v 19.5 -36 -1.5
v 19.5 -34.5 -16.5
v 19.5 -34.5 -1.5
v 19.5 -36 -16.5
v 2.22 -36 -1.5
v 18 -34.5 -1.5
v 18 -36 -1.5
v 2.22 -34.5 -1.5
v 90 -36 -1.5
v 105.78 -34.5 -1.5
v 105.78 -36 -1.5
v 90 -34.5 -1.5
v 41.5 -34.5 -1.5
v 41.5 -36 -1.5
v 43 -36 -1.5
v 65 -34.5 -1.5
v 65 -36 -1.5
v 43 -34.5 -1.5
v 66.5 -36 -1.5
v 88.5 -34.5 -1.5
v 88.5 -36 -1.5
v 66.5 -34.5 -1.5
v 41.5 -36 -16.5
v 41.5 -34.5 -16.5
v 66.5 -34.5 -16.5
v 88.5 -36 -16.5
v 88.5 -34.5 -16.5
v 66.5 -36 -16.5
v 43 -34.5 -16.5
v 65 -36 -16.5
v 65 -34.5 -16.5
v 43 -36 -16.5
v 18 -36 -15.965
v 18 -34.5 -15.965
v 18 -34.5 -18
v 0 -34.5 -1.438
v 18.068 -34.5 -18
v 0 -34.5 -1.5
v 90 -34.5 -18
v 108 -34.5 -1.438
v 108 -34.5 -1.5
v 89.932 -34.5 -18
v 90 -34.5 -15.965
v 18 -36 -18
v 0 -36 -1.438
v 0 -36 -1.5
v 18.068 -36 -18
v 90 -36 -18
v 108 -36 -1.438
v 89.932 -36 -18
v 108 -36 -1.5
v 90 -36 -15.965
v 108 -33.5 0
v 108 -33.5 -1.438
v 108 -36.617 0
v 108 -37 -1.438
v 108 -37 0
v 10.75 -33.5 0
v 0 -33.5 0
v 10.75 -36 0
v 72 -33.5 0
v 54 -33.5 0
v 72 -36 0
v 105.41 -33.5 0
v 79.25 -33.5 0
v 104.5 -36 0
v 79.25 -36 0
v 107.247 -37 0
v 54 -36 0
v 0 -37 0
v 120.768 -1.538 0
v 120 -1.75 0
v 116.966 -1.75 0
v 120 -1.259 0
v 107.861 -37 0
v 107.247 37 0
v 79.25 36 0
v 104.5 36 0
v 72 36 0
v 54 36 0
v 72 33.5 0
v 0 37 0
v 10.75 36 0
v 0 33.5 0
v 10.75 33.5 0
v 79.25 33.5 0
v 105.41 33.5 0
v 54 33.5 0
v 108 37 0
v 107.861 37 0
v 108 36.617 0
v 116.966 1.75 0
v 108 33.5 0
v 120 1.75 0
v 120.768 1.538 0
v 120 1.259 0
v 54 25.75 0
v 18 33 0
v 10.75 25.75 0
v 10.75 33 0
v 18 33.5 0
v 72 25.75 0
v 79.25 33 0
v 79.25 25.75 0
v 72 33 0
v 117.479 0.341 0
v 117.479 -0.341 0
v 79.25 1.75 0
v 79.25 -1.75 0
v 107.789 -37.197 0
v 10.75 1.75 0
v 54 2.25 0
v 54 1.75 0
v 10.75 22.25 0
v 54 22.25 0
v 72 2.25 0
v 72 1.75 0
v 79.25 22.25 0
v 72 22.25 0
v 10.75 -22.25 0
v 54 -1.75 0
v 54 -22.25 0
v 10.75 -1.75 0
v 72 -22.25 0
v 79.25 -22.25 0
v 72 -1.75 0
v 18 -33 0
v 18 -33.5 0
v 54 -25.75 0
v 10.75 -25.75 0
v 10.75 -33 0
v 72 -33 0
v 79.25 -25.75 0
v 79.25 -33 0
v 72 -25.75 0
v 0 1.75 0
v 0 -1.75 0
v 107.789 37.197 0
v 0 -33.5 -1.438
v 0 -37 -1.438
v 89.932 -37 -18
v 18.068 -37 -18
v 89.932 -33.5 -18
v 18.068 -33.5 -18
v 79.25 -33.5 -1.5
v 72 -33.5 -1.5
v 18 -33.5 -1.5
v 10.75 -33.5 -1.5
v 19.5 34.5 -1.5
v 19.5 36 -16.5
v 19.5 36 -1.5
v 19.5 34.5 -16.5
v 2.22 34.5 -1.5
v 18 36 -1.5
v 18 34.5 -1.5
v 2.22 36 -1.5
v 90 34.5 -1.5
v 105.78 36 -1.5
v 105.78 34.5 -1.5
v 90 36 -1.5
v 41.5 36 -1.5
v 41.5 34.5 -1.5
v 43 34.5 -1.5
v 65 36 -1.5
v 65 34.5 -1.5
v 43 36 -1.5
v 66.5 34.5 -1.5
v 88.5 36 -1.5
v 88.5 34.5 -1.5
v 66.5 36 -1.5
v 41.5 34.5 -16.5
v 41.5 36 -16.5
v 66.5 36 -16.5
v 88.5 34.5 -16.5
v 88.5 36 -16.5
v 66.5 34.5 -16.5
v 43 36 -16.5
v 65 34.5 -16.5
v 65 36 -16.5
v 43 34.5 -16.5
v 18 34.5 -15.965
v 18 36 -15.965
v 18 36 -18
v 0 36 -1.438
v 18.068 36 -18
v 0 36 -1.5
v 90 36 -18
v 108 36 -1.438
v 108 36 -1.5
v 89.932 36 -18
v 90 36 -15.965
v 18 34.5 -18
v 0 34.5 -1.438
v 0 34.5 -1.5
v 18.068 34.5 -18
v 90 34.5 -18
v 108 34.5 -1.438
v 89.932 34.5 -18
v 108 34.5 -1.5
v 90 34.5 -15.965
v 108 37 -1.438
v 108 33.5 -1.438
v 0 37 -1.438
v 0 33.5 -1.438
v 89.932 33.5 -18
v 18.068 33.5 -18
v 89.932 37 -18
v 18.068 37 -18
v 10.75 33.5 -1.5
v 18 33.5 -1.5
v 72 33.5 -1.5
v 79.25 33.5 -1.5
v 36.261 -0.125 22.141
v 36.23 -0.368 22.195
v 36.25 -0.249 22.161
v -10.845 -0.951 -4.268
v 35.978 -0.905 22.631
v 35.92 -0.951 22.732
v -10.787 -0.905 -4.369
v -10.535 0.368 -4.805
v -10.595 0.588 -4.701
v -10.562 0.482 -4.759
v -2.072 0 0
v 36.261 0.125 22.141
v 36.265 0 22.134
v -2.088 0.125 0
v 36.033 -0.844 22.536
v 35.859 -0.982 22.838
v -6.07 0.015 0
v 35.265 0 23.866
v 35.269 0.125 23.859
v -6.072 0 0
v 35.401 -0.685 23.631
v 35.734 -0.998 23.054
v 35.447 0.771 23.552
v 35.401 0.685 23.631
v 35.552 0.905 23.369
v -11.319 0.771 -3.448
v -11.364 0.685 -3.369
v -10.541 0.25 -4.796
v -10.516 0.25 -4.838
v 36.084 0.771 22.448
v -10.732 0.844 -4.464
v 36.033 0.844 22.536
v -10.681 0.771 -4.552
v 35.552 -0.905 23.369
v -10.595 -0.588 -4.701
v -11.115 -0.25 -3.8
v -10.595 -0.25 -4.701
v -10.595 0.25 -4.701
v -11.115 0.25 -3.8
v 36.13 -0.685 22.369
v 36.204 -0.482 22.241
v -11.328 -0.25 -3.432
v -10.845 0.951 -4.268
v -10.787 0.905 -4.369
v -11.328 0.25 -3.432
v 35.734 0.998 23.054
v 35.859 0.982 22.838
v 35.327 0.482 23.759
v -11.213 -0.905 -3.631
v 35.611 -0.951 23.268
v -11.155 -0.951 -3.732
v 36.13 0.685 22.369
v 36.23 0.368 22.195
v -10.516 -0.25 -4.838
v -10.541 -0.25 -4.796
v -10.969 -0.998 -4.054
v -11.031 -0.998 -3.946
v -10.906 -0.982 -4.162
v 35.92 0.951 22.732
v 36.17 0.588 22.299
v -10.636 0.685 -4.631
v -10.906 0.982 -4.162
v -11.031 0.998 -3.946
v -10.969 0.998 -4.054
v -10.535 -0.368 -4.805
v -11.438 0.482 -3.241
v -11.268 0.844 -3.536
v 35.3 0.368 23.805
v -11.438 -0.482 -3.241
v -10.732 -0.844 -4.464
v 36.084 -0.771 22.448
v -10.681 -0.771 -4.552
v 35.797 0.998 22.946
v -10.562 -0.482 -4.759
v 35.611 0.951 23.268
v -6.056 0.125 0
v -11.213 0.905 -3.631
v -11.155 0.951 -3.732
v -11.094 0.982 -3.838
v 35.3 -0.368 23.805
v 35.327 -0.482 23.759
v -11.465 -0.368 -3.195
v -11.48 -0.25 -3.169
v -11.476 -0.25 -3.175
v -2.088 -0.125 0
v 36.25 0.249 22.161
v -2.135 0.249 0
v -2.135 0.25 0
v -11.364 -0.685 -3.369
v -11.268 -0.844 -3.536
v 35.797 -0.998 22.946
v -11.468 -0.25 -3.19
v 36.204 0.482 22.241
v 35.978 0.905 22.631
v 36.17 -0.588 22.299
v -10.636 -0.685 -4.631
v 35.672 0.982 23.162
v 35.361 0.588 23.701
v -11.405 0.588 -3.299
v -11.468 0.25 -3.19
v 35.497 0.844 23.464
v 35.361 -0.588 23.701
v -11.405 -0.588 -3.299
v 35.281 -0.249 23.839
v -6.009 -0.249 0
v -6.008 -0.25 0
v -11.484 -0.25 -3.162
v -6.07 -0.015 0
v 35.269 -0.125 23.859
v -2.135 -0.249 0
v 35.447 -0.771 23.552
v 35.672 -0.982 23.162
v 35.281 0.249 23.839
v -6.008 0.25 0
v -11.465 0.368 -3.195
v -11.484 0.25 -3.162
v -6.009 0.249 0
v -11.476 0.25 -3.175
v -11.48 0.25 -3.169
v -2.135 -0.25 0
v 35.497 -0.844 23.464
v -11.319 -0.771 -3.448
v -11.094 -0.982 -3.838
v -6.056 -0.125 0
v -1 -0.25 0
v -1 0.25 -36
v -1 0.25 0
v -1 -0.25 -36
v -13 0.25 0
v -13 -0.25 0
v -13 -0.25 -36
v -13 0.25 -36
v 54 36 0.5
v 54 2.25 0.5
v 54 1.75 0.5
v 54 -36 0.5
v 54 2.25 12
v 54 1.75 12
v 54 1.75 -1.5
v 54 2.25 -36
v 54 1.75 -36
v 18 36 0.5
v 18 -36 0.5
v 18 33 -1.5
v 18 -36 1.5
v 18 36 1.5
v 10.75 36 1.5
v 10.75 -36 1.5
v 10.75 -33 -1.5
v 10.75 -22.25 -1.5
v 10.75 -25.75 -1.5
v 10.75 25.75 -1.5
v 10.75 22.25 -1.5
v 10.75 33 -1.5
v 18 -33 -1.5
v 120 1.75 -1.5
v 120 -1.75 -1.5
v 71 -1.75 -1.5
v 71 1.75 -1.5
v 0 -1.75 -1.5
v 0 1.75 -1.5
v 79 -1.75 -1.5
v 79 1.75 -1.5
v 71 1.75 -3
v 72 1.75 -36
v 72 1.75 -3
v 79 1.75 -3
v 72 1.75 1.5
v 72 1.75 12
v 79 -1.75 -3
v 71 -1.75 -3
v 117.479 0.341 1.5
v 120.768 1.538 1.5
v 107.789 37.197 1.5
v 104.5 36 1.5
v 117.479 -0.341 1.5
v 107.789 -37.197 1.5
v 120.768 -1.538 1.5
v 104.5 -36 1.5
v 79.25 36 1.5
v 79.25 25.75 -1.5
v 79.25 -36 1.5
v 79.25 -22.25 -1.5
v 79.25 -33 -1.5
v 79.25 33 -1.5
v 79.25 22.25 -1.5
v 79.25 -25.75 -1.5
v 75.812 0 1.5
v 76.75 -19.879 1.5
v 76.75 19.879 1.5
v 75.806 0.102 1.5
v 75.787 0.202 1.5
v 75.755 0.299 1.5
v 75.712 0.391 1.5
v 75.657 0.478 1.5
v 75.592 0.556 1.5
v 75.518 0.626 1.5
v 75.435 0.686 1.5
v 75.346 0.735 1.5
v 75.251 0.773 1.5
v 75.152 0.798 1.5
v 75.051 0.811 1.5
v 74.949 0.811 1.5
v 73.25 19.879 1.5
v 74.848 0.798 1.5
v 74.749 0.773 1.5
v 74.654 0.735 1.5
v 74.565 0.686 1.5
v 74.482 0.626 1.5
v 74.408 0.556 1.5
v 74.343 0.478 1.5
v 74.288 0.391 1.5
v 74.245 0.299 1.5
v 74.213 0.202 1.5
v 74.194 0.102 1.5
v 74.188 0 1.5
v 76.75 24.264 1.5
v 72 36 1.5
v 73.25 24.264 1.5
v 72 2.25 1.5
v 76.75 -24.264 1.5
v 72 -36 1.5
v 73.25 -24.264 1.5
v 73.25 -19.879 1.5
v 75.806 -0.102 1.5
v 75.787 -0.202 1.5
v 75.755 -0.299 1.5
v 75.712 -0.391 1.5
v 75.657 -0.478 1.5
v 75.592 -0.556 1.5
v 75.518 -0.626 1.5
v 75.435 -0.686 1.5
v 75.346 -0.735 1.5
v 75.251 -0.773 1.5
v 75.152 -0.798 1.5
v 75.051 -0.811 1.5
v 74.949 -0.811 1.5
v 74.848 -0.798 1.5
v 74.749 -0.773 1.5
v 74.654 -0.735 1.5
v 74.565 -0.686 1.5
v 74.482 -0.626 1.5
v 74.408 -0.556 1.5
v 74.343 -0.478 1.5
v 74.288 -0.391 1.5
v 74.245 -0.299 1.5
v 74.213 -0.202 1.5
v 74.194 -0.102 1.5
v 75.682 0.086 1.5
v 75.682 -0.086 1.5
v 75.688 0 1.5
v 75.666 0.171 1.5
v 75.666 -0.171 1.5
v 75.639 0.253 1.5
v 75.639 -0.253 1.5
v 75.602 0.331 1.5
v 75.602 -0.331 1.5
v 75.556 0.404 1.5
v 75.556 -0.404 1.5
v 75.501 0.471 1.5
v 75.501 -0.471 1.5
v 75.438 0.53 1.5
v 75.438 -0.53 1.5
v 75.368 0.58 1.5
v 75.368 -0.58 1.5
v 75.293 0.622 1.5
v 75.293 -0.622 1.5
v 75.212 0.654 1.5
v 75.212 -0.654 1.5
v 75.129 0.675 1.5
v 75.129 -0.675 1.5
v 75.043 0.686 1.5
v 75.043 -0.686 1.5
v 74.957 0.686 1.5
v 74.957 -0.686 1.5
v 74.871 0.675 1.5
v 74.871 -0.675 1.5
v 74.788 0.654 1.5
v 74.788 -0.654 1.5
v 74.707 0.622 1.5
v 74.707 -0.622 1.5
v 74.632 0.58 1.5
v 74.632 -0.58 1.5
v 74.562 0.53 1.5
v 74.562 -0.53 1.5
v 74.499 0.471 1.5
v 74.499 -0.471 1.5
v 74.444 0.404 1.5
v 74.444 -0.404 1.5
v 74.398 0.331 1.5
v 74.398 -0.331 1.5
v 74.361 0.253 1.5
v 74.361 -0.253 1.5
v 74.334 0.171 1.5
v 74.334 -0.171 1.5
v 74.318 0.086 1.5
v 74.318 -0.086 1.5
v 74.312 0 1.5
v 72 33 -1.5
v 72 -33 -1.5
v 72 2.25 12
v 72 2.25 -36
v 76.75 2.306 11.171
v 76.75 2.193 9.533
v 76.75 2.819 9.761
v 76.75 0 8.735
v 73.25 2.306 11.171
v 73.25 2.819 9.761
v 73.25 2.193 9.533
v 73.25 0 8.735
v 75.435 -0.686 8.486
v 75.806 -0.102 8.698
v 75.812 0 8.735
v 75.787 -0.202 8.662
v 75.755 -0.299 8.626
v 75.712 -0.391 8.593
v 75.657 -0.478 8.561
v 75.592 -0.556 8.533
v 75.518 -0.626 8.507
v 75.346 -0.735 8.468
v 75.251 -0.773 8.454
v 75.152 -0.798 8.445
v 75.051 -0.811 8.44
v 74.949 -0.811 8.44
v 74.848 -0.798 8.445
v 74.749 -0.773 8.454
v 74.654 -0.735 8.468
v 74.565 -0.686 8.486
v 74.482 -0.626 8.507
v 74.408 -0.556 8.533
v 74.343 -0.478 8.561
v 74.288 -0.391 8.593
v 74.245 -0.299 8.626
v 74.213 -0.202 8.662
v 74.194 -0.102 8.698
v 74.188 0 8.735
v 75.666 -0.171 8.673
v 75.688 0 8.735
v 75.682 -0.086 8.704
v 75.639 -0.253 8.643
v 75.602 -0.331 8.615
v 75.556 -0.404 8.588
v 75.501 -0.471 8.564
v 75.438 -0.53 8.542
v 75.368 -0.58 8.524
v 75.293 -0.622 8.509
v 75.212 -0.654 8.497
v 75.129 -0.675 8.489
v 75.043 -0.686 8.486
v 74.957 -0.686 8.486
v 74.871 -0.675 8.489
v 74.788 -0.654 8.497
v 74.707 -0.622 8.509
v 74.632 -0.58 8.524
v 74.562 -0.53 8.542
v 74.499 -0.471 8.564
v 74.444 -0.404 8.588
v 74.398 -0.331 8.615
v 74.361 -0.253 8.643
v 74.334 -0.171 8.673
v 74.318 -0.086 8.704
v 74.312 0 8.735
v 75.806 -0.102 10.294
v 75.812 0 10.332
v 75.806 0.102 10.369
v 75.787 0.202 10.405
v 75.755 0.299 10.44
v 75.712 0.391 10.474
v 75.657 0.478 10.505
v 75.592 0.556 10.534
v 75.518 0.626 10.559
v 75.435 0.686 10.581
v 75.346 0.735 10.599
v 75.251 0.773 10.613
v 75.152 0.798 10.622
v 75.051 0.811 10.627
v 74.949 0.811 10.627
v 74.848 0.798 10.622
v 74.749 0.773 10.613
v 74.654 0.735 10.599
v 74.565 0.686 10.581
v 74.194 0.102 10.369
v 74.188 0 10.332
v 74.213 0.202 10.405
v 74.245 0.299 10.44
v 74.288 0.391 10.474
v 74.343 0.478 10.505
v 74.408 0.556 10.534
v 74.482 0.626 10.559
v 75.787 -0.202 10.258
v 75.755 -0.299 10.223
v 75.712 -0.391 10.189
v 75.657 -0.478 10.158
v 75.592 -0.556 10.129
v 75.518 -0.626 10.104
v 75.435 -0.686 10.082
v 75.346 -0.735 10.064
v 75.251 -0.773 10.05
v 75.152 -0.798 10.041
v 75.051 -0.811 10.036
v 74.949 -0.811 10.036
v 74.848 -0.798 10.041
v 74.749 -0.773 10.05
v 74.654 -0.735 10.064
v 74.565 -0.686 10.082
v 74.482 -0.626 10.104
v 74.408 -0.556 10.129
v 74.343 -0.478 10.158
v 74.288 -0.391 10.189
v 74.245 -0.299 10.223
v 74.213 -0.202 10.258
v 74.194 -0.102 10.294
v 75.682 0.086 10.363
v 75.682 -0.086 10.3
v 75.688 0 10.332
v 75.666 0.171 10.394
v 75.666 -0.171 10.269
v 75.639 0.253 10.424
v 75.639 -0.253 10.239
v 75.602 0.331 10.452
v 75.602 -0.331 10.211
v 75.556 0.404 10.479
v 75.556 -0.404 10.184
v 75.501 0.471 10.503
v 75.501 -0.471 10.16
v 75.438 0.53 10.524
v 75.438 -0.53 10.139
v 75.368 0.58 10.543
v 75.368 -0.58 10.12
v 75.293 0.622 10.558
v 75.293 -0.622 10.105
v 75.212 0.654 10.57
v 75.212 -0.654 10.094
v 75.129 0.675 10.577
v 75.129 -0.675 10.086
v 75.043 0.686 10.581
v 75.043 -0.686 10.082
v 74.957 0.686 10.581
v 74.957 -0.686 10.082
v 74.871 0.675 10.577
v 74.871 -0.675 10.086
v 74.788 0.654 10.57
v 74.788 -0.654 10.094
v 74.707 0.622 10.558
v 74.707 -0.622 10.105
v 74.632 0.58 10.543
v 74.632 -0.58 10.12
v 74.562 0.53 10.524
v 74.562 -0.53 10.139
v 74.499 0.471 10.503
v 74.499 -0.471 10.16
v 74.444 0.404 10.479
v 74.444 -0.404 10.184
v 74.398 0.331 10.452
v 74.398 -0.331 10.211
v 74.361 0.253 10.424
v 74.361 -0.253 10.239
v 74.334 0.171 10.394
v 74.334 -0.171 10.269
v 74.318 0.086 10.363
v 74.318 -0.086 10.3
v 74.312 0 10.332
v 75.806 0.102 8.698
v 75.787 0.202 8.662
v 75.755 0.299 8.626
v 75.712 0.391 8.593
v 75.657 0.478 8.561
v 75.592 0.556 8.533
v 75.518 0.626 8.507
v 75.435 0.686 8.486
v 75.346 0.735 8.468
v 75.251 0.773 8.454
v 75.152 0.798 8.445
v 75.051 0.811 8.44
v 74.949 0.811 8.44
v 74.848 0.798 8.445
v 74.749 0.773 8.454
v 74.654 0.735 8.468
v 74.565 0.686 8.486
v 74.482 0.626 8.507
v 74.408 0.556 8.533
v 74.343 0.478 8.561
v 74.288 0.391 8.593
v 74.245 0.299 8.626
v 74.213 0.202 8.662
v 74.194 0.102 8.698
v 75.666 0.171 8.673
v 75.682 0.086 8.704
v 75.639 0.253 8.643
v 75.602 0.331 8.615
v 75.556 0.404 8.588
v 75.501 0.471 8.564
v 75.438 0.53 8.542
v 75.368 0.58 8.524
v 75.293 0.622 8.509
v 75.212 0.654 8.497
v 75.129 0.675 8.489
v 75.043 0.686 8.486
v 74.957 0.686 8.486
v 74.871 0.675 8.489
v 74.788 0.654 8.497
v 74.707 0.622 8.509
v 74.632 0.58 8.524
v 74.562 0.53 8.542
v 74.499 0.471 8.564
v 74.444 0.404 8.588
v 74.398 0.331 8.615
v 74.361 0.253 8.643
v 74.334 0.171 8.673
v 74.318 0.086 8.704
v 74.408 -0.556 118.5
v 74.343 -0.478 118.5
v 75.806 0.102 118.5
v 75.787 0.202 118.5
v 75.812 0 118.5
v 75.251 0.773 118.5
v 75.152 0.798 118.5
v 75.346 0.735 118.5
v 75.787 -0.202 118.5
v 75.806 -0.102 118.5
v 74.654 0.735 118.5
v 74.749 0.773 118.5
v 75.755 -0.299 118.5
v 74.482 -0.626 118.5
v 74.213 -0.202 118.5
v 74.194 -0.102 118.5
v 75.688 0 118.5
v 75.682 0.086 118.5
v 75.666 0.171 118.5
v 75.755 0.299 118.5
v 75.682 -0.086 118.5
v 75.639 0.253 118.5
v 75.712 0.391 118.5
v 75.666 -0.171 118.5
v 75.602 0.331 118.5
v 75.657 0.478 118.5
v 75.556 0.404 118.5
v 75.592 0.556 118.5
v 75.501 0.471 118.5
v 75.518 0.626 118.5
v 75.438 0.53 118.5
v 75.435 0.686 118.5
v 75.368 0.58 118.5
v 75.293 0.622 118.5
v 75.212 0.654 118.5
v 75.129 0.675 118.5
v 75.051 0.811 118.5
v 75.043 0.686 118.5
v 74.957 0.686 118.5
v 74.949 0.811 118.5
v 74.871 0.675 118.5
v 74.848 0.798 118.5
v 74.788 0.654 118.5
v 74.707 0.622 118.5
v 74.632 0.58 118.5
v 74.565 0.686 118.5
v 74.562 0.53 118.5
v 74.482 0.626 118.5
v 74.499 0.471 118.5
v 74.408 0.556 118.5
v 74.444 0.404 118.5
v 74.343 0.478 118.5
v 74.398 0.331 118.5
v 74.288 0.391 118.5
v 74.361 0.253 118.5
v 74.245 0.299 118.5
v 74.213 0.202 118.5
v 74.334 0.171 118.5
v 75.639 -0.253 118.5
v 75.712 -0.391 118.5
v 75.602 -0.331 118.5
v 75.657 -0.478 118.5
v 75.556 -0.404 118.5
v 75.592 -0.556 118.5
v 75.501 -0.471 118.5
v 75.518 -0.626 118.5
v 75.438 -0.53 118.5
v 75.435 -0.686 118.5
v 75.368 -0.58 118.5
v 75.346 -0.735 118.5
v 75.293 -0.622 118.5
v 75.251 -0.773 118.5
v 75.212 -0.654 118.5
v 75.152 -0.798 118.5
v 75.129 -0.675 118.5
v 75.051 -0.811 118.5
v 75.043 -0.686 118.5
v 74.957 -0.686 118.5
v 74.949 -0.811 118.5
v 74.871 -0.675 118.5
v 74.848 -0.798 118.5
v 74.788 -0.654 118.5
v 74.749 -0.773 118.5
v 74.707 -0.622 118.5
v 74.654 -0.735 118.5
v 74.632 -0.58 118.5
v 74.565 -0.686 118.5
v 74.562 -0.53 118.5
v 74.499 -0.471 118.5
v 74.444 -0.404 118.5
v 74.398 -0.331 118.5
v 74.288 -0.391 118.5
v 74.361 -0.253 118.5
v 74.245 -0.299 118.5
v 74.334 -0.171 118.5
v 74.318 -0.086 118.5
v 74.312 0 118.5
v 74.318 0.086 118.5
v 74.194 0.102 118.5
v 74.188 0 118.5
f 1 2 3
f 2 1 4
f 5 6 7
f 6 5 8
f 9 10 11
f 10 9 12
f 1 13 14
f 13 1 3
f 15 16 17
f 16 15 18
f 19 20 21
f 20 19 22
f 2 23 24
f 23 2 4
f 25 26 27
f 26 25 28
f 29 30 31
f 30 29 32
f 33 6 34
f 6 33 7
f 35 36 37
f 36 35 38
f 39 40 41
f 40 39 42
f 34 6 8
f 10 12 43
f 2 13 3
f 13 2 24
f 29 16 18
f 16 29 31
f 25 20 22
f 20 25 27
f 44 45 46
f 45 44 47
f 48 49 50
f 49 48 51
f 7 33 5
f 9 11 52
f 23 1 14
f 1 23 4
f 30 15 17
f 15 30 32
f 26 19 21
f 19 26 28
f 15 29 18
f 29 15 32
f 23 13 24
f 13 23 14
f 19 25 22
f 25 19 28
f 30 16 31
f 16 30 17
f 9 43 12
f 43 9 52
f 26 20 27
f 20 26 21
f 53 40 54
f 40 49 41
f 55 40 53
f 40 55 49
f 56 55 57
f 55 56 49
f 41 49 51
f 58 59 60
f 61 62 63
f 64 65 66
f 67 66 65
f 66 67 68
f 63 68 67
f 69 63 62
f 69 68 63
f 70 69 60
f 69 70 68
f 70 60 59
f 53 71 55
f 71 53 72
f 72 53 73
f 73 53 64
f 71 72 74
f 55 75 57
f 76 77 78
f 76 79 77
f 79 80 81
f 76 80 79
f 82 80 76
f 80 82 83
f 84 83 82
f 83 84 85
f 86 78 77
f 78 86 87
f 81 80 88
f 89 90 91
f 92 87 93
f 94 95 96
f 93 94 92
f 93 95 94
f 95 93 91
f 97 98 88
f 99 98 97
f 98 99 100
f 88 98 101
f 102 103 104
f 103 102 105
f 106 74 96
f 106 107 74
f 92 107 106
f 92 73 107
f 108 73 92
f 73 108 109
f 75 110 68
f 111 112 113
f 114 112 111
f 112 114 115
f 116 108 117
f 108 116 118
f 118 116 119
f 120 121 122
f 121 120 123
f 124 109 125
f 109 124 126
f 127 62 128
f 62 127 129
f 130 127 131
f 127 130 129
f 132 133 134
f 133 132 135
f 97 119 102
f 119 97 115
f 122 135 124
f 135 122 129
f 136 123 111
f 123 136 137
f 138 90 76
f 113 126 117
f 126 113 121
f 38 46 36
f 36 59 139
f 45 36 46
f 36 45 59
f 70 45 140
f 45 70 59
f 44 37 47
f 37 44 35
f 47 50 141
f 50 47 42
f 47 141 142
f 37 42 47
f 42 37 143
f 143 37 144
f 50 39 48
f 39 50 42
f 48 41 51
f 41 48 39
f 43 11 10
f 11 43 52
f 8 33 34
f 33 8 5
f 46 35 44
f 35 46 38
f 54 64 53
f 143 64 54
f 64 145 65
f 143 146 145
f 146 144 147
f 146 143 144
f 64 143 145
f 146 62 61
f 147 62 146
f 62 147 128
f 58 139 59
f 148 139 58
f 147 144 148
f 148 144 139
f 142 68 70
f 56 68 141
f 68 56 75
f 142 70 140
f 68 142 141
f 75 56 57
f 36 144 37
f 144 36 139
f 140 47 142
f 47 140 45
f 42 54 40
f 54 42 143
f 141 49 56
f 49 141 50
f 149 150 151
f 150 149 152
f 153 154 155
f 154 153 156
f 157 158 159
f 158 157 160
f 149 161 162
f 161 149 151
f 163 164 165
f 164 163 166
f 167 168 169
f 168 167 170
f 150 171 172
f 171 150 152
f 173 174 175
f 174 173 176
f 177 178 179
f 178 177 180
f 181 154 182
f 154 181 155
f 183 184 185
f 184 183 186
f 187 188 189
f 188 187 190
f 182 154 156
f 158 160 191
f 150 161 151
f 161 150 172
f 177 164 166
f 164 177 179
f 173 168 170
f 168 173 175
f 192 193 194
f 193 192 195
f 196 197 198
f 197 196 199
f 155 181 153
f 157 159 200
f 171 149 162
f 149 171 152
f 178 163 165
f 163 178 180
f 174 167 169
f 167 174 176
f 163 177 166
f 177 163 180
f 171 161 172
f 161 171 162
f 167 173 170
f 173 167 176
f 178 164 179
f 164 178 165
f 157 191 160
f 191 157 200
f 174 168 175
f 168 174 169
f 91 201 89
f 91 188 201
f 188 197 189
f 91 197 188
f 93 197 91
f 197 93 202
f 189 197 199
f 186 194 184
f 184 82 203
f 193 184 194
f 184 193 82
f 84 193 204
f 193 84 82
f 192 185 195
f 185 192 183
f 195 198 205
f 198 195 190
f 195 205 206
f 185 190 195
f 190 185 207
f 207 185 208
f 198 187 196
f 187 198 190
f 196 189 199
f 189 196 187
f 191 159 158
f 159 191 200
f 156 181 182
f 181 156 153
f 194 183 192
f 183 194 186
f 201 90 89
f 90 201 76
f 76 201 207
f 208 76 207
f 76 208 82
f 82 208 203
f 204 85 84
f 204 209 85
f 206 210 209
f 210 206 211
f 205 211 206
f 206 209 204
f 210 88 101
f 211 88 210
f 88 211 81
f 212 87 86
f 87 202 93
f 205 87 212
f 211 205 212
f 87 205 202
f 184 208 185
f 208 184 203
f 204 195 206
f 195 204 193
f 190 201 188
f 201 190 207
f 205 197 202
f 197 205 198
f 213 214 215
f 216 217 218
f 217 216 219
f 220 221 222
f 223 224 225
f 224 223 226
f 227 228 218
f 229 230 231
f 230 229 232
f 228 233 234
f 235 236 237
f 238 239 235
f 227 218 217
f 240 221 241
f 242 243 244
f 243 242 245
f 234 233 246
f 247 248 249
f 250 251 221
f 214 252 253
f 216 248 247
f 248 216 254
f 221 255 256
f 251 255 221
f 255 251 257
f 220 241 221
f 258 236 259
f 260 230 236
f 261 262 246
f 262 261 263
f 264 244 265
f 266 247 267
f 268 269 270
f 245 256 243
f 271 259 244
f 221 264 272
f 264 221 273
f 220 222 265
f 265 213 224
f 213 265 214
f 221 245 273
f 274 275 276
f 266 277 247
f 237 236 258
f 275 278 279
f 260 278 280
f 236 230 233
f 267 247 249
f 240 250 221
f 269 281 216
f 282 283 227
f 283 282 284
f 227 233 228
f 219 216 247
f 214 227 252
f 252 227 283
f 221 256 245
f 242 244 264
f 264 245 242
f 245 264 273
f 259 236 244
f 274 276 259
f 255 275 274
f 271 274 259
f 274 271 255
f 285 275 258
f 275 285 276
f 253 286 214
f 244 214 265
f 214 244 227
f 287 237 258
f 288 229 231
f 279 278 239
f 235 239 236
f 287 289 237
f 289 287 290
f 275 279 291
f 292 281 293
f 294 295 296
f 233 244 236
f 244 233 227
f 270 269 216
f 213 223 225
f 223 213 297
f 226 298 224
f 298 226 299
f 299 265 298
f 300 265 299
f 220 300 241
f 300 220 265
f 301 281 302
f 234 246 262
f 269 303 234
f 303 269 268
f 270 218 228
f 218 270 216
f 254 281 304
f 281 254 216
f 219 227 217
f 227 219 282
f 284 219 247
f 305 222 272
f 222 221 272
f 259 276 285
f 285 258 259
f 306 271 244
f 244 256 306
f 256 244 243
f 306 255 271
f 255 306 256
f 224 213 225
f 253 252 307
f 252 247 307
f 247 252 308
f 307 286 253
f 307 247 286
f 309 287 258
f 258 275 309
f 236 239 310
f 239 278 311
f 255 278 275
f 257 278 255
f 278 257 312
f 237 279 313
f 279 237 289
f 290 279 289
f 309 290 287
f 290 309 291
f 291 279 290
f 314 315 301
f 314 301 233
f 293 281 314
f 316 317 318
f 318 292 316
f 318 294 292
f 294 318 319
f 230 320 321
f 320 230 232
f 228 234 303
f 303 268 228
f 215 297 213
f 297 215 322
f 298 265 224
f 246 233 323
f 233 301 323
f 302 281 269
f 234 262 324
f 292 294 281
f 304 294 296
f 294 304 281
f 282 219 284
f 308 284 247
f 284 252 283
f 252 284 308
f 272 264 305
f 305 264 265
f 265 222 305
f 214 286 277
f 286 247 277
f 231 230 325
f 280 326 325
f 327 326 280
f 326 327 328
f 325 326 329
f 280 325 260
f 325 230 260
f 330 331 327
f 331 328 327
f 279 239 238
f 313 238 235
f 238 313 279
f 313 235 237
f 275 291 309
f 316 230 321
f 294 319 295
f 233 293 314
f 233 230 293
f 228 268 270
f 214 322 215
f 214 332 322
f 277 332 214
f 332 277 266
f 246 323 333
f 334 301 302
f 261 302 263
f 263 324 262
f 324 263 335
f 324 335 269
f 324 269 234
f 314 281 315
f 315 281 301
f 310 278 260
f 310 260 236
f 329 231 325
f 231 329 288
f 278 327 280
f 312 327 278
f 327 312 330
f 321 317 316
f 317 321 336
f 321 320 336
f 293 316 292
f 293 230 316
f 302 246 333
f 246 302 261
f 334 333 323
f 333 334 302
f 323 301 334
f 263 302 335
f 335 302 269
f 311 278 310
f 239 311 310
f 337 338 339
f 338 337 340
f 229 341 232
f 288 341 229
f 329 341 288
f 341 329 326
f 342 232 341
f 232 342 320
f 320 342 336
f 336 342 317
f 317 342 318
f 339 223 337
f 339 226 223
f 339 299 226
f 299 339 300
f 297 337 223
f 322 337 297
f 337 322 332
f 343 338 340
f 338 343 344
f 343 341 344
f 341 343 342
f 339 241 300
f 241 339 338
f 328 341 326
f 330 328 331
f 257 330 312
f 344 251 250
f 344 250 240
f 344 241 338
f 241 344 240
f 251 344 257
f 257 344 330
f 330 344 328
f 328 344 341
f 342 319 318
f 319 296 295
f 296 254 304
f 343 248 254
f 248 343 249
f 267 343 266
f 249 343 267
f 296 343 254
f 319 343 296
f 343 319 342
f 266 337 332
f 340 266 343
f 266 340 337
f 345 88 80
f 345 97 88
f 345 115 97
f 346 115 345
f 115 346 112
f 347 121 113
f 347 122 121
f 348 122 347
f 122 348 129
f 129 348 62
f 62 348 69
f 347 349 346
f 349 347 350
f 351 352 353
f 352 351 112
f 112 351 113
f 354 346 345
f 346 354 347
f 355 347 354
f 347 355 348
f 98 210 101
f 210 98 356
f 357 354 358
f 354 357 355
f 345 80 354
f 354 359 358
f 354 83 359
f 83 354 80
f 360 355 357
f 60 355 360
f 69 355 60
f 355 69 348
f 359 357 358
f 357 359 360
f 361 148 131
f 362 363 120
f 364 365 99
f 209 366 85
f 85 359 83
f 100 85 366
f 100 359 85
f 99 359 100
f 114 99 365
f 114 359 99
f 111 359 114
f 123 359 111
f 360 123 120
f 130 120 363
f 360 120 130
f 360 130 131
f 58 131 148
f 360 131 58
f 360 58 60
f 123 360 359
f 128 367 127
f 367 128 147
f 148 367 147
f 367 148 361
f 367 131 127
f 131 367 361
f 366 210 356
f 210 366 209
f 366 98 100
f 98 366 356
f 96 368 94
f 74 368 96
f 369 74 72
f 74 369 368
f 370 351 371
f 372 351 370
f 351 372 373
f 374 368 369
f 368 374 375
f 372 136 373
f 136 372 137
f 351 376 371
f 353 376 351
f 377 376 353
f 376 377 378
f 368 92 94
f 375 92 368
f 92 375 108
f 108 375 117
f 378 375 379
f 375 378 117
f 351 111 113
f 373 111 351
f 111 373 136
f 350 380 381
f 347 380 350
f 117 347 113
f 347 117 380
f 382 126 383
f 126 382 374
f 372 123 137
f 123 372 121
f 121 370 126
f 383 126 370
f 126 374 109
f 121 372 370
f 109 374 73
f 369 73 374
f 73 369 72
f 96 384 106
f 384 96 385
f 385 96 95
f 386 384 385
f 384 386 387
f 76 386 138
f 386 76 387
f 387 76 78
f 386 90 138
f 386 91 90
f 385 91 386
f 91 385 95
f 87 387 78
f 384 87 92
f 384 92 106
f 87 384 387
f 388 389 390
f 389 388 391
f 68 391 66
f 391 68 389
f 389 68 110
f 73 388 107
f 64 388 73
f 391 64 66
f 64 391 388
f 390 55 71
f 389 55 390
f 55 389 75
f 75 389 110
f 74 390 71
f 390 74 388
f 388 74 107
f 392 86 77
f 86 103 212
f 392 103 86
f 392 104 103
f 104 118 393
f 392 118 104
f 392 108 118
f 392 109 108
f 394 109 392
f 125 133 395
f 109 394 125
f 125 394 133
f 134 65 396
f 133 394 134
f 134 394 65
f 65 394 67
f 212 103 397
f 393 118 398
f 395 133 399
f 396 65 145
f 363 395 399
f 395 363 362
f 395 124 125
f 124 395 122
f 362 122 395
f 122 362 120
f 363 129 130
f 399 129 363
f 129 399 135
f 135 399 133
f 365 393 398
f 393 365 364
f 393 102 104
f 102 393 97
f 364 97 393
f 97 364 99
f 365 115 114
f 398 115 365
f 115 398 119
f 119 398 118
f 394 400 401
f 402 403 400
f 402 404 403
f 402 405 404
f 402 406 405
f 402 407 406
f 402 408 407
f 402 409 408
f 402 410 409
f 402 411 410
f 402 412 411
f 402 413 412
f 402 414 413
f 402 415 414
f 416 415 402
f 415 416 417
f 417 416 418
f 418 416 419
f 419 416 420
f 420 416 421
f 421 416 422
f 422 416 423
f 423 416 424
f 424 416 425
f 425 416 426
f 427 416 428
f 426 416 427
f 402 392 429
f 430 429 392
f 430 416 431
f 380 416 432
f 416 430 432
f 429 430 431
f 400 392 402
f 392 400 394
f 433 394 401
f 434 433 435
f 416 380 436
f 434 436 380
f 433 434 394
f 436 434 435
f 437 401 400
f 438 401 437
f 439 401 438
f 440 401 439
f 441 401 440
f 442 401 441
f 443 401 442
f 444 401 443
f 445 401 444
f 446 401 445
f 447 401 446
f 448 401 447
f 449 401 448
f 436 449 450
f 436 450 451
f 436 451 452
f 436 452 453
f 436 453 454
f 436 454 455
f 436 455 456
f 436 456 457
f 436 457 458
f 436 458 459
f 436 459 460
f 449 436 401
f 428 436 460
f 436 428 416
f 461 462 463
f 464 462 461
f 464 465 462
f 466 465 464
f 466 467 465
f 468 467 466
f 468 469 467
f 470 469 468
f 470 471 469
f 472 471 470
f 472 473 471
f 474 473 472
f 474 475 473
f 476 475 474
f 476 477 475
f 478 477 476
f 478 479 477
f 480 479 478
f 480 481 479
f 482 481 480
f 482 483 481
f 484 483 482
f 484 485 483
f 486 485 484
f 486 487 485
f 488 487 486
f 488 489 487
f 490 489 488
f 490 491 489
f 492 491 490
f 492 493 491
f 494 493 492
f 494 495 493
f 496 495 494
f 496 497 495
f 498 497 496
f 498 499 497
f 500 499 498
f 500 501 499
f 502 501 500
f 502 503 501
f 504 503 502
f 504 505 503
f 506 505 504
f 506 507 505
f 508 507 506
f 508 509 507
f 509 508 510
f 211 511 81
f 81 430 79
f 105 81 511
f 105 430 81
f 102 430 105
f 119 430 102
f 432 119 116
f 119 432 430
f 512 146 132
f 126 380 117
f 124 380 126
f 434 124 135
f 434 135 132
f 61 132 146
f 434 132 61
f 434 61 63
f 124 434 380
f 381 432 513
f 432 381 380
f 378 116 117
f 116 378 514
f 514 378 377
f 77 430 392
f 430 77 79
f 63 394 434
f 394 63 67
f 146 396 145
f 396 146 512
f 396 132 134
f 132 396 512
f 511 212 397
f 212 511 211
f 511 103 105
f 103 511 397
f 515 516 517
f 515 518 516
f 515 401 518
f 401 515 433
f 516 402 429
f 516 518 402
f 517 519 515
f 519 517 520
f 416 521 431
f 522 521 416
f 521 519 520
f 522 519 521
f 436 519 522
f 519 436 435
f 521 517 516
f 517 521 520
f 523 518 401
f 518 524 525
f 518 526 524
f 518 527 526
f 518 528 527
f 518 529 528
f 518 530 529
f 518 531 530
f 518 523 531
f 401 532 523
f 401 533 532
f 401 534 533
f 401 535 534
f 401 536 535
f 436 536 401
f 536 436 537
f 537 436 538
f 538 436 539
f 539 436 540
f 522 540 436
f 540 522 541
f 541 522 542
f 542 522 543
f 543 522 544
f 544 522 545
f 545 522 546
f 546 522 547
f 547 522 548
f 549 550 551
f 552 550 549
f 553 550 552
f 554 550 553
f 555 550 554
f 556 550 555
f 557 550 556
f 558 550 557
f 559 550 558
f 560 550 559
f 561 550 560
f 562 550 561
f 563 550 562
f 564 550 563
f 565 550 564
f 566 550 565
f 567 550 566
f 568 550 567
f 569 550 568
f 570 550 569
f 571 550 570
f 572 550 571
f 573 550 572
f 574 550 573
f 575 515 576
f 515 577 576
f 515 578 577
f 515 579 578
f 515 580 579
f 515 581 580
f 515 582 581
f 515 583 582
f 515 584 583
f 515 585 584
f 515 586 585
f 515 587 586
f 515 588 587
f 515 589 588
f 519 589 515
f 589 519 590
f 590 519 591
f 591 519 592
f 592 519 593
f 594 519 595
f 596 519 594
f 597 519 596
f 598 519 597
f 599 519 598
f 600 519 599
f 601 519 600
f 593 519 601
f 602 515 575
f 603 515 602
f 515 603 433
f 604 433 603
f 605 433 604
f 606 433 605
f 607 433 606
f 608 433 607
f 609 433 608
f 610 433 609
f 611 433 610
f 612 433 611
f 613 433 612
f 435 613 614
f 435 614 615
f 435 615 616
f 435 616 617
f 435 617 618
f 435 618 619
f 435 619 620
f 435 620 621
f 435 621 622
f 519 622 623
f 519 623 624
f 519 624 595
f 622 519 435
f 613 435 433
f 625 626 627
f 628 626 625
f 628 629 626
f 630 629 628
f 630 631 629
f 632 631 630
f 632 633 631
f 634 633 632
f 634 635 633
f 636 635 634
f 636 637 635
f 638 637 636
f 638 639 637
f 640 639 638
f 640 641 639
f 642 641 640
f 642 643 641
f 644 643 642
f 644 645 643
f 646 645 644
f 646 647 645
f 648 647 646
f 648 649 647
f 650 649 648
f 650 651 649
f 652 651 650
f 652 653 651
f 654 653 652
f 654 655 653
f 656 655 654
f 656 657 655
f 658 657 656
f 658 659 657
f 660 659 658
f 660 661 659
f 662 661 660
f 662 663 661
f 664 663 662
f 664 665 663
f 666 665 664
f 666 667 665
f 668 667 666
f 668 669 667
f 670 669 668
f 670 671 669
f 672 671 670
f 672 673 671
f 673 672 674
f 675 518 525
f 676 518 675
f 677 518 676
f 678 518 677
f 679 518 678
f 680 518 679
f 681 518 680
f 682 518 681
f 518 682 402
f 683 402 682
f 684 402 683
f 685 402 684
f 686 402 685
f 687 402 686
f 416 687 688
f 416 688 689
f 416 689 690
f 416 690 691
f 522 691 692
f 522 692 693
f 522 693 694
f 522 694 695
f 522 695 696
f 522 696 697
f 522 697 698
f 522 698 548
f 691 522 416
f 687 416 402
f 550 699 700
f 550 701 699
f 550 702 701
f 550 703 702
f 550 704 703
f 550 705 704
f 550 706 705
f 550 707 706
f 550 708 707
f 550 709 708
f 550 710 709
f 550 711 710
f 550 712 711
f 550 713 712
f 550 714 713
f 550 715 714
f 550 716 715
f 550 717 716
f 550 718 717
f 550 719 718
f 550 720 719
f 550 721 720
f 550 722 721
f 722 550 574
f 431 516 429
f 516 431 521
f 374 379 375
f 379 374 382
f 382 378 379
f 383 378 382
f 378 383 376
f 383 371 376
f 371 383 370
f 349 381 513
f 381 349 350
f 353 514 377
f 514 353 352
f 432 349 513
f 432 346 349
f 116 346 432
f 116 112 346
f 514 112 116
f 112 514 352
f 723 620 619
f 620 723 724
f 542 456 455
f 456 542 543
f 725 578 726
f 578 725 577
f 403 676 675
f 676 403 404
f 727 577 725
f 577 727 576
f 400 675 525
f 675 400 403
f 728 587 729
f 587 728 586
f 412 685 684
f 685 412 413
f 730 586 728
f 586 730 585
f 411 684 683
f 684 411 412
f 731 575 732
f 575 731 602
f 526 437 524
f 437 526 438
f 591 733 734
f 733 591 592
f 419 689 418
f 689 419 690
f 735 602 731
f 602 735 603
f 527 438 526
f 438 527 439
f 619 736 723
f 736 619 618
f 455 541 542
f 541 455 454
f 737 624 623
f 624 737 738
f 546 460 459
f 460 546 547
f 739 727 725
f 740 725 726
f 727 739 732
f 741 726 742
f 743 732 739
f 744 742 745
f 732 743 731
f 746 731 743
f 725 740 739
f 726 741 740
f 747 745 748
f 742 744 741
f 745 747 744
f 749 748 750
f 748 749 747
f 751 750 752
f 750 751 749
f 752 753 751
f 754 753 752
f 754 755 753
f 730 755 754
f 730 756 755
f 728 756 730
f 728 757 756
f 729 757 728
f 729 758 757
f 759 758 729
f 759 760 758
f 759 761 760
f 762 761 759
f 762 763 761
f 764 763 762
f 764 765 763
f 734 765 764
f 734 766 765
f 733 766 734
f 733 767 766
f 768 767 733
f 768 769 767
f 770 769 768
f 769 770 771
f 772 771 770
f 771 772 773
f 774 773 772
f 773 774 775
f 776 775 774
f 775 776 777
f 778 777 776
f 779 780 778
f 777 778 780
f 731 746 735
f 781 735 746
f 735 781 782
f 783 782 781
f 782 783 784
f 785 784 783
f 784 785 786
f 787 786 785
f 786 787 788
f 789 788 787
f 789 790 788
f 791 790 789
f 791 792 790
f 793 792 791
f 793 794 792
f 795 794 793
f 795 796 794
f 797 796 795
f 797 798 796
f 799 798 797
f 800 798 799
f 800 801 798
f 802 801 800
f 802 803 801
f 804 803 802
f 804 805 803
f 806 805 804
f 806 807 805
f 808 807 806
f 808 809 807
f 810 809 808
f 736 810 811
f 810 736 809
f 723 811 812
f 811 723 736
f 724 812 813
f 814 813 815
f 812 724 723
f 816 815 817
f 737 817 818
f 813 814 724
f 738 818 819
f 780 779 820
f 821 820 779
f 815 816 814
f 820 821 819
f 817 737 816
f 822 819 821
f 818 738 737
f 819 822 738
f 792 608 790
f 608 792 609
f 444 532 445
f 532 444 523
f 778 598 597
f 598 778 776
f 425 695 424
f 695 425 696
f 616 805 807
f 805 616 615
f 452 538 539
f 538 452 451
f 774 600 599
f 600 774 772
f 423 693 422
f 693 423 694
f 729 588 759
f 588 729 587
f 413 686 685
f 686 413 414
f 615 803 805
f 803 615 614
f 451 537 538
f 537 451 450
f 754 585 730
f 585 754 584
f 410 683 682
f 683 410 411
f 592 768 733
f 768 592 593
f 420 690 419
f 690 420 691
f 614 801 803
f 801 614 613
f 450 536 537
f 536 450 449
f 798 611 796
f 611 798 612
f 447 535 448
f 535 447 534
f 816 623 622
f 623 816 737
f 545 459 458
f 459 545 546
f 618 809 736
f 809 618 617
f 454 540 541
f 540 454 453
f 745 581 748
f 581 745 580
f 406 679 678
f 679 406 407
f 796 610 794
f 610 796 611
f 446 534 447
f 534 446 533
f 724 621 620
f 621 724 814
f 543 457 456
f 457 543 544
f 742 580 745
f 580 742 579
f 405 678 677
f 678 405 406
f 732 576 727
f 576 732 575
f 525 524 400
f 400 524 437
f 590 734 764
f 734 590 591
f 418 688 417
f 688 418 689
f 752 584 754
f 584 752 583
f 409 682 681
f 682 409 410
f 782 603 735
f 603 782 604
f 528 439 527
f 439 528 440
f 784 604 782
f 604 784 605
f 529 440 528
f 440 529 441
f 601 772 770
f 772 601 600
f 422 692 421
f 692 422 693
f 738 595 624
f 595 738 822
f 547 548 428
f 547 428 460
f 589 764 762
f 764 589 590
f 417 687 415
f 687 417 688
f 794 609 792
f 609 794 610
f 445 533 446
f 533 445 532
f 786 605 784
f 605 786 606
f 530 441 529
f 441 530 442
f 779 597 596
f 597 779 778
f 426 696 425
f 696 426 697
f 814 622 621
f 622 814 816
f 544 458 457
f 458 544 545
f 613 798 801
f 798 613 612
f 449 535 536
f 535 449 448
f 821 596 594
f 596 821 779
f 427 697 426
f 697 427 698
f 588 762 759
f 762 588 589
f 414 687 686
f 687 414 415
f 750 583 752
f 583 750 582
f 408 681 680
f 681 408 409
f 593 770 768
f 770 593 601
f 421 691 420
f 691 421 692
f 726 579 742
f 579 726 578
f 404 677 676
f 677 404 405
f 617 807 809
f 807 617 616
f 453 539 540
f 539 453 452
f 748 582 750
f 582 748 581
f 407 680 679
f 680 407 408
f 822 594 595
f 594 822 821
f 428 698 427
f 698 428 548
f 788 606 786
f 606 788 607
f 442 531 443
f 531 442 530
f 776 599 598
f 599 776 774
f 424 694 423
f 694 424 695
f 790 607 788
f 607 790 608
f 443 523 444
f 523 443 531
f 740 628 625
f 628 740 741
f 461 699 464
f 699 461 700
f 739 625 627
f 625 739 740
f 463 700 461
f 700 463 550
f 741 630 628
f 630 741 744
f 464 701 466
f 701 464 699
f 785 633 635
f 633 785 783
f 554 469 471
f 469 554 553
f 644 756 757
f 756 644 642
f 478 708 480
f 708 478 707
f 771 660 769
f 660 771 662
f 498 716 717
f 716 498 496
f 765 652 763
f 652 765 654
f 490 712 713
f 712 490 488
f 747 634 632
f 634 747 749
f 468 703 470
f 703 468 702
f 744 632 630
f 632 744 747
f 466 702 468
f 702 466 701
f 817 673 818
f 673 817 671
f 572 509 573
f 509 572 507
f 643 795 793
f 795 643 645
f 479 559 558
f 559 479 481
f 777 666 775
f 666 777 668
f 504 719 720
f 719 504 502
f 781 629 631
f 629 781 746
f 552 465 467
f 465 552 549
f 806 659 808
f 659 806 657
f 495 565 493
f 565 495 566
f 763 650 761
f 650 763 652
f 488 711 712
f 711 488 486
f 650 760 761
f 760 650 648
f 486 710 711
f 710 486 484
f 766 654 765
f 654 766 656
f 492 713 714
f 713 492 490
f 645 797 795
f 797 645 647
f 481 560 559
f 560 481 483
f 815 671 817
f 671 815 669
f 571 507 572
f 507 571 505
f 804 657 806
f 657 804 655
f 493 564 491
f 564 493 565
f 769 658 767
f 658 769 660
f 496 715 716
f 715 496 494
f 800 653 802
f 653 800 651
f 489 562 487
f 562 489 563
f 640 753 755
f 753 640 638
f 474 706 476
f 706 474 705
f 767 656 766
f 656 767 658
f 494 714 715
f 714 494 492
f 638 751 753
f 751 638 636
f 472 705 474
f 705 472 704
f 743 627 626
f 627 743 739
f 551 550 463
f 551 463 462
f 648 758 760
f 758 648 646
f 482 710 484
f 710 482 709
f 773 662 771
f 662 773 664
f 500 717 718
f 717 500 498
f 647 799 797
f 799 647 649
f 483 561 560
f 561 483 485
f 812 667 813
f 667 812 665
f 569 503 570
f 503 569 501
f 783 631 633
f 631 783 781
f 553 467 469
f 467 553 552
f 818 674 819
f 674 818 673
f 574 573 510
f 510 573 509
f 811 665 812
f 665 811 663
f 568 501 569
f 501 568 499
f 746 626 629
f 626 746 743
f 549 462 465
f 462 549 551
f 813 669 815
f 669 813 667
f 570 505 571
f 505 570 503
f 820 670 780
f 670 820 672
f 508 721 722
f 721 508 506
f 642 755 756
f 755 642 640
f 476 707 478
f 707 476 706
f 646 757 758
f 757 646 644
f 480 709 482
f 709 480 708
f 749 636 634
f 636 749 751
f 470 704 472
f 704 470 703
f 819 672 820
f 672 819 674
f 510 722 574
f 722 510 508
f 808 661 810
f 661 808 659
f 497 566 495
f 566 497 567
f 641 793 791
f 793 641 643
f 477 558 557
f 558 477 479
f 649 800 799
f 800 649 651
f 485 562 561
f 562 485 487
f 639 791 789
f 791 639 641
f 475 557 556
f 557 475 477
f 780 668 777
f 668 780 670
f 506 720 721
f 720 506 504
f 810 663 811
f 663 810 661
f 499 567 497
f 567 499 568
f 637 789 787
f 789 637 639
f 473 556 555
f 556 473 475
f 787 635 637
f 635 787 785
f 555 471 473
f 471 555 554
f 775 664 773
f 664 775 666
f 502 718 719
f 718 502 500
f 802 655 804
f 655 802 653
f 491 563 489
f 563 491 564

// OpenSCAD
// file: rudder.scad
module rudder(length=12,height=24, y_angle=0, z_angle=0, handle_length=48, handle_angle=30){
	plywood_thickness=.5;

	rotate([0,y_angle,z_angle]){
		translate([-length+2,0,-4])
			rotate([0,handle_angle,0])
			cylinder(h=handle_length,d=2, $fn=50);
		translate([-length,-plywood_thickness/2,-height])
			cube([length,plywood_thickness,height]);
	}
}
rudder();
// file: pontoon.scad
module pontoon(length=108, height=18, foam_vis=false, foam_board_thickness=2, board_number=1, n_vert=3, side="port") {
	//// VARIABLES ////

	function b1()=0.5; //One-by-one
	function b2()=1.5; //One-by-one
	b1=.5;
	b2=1.5;
	b4=3.5;
	b8=7.5;
	plywood_thickness=.5;
	bottom_length=length-height*2-b2();
	bottom_x=bottom_length/(n_vert-1);
	xy=[height, height-b2()];
	//echo(xy[0]);echo(xy[1]);
	hyp=sqrt((xy[0]*xy[0])+(xy[1]*xy[1]));
	angle=atan2(xy[0],xy[1]);
	echo(angle);
	//echo(hyp);

	//// GENERATION CODE ////

	color("BurlyWood", 1.0){ // This color represents softwood.

		// TOP SUPPORT //
		cube([length,b2(),b2()]);

		// VERTICAL SUPPORTS //
		for(i = [0:n_vert-1]){
			translate([height+bottom_x*i,0,0]){
				translate([0,0,-height+b2()*2])
					cube([b2(),b2(),height-b2()*2]);
				/*// CORNER SUPPORTS
				  translate([0,0,-b8+b2]){
				  if(side=="starboard" || side=="right"){
				  translate([0,b2,0])
				  cube([b2,b4,b8]);
				//echo("It's starboard!");
				}
				else if(side=="port" || side == "left"){
				translate([0,-b4,0])
				cube([b2,b4,b8]);
				}
				}*/
			}
		}

		// BOTTOM SUPPORT //
		translate([height,0,-height+b2()])
			cube([bottom_length+b2(),b2(),b2()]);

		// FRONT SUPPORT //
		/*translate([bottom_length+height*1.5,b2()/2,-height/2+b2()])
		  rotate([0,angle,0])
		  cube([b2(),b2(),hyp], center=true);*/
		translate([length,0,0])mirror([1,0,0])
			translate([height,0,-height+b2()])
			rotate([0,-angle,0])
			cube([b2(),b2(),hyp]);//,center=true);

		// REAR SUPPORT //
		translate([height,0,-height+b2()])
			rotate([0,-angle,0])
			cube([b2(),b2(),hyp]);//,center=true);
	}

	// FOAM //
	if(foam_vis==true){
		color("Pink", 1.0){
			difference(){
				for(i=[b2(),-board_number*foam_board_thickness]){
					translate([0,i,-height+b2()])
						cube([length,foam_board_thickness*board_number,height]);
				}
				for(i=[false,true]){
					translate([-b2()/2,0,-hyp+b2()/2])
						rotate([0,-angle,0])
						cube(height*2, center=true);
					if(i==true){
						translate([length,0,0])mirror([1,0,0])
							translate([-b2()/2,0,-hyp+b2()/2])
							rotate([0,-angle,0])
							cube(height*2, center=true);
					}
				}
			}
		}
	}
}
pontoon();
// main file
/*
   This catamaran design by Luke Bubar <https://lukebubar.xyz>

   All units in inches.
   */

//// MODULES ////

use <pontoon.scad>
use <rudder.scad>

//// VARIABLES ///

function N()=50;

// WOOD //
b1=.5;
b2=1.5;
b4=3.5;
b8=7.25;
plywood_thickness=.5;

// PLYWOOD SEAT //
plywood_length=72;
plywood_width=36;
seat_x=18;

//echo("Plywood needed: ", plywood_length/12, "feet by ", plywood_width/12, "feet");

// CENTER PLANK //
center_plank_length=120;

// PONTOON //
pontoon_length=center_plank_length-12;
pontoon_height=18;
pontoon_show=true;
foam_board_thickness=1;
foam_board_number=1;
pontoon_vertical_supports=4;

// RUDDER //
rudder_length=12;
rudder_height=pontoon_height+18;
rudder_y_angle=0;
rudder_z_angle=0;
handle_length=54;
handle_angle=60;


echo("Foam needed: ", pontoon_length/12, "feet by ", pontoon_height/12, "feet");

// LEAST BOW PLANK //
least_bow_plank_x=72;

// STERN PLANK //
stern_plank_x=seat_x-b8;

// CENTER SPINE SUPPORTS //
center_spine_support_xy=[
	(plywood_length/2*plywood_length/2)
	,
	((center_plank_length-pontoon_length)*(center_plank_length-pontoon_length))
];

center_spine_support_angle=atan2(center_spine_support_xy[0],center_spine_support_xy[1]);
echo("The center spine support angle is ", center_spine_support_angle);
center_spine_support_length=sqrt(center_spine_support_xy[0]+center_spine_support_xy[1]);
echo("The center_spine_support_length is ", center_spine_support_length);

// SPINE SUPPORTS //

spine_supports_y=24;

// MAST //
mast_forward_x=75;
mast_height=120;
mast_outer_diameter=1+5/8;
mast_wall=1/8;
mast_inner_diameter=mast_outer_diameter-mast_wall*2;
mast_down_y=0;

// MAST HOLDER //
mast_holder_height=8;
//mast_holder_inner_diameter=mast_outer_diameter;
mast_holder_inner_diameter=1.913;
//mast_holder_wall=mast_wall*2;
mast_holder_outer_diameter=2.375;

// MAST SUPPORTS //

mast_support_angle=20;
mast_support_y=spine_supports_y;
mast_support_length=(spine_supports_y/cos(mast_support_angle));
echo("The mast support board length is", mast_support_length);

//// GENERATION CODE ///

// STARBOARD PONTOON //
translate([0,-plywood_length/2,-b2])
	pontoon(pontoon_length,pontoon_height, pontoon_show, foam_board_thickness, foam_board_number, pontoon_vertical_supports, "starboard");

	// PORT PONTOON //
translate([0,plywood_length/2-b2,-b2])
	pontoon(pontoon_length,pontoon_height, pontoon_show, foam_board_thickness, foam_board_number, pontoon_vertical_supports, "port");

	color("BurlyWood", 1.0){ // This color represents softwood.

		// PLYWOOD SEAT //
		translate([seat_x,-plywood_length/2,0])
			cube([plywood_width,plywood_length,plywood_thickness]);

		// STERN PLANK //
		translate([stern_plank_x,-plywood_length/2,0])
			cube([b8,plywood_length,b2]);
		// stern plank corner port support
		translate([stern_plank_x,(-plywood_length/2)+b2,-b2])
		cube([b8,b2,b2]);
		// stern plank corner starboard support
		translate([stern_plank_x,(plywood_length/2)-2*b2,-b2])
		cube([b8,b2,b2]);

		// CENTER SPINE PLANK //
		translate([0,-b4/2,-b2])
			cube([center_plank_length,b4,b2]);

		// CENTER SPINE BOW SUPPORTS //
		translate([pontoon_length-b4,plywood_length/2,0])
			//cube([b4,48,b2]);
			rotate([0,0,-70])
			cube([center_spine_support_length,b4,b2]);
		mirror([0,1,0])
			translate([pontoon_length-b4,plywood_length/2,0])
			rotate([0,0,-70])
			cube([center_spine_support_length,b4,b2]);

		// PORT SPINE PLANK //
		translate([stern_plank_x,-b4/2-spine_supports_y,-b2])
			cube([least_bow_plank_x+b8-stern_plank_x,b4,b2]);
			echo ("The side spine plank length is", least_bow_plank_x+b8-stern_plank_x);

		// STARBOARD SPINE PLANK //
		translate([stern_plank_x,-b4/2+spine_supports_y,-b2])
			cube([least_bow_plank_x+b8-stern_plank_x,b4,b2]);

		// LEAST BOW PLANK //
		translate([least_bow_plank_x,-plywood_length/2,0])
			cube([b8,plywood_length,b2]);
		// least bow plank corner port support
		translate([least_bow_plank_x,(-plywood_length/2)+b2,-b2])
		cube([b8,b2,b2]);
		// least bow plank corner starboard support
		translate([least_bow_plank_x,(plywood_length/2)-2*b2,-b2])
		cube([b8,b2,b2]);


		// MAST SUPPORTS //

		// right
		mirror([0,1,0])
			translate([mast_forward_x-b4/2,mast_support_y,0])
			rotate([90-mast_support_angle,0,0])
			cube([b4,b2,mast_support_length+3]);
		// left
		translate([mast_forward_x-b4/2,mast_support_y,0])
			rotate([90-mast_support_angle,0,0])
			cube([b4,b2,mast_support_length]);
		// bottom
		bottom_support_length=8;
		translate([mast_forward_x-bottom_support_length/2,-b4/2,-b2*2])
			cube([bottom_support_length,b4,b2]);

		// RUDDER //
		translate([-1,0,0])
			rudder(rudder_length,rudder_height,rudder_y_angle, rudder_z_angle, handle_length, handle_angle);

		// CENTER RUNNER //
		translate([plywood_width+seat_x,b4/2,-3*12])
		cube([least_bow_plank_x-(plywood_width+seat_x),plywood_thickness,4*12]);
	}
// MAST //
color("Gray", 1.0){
	translate([mast_forward_x,0,-b2-mast_down_y])
		difference(){
			cylinder(mast_height,d=mast_outer_diameter,$fn=N());
			translate([0,0,-1])cylinder(mast_height+2,d=mast_inner_diameter,$fn=N());
		}
}

// MAST HOLDER //
/*color("White", 1.0){
  translate([mast_forward_x,0,-b2-mast_holder_height])
  difference(){
  cylinder(mast_holder_height, d=mast_holder_outer_diameter, $fn=N());
  translate([0,0,-1])cylinder(mast_holder_height+2,d=mast_holder_inner_diameter,$fn=N());
  }
  }
  */
